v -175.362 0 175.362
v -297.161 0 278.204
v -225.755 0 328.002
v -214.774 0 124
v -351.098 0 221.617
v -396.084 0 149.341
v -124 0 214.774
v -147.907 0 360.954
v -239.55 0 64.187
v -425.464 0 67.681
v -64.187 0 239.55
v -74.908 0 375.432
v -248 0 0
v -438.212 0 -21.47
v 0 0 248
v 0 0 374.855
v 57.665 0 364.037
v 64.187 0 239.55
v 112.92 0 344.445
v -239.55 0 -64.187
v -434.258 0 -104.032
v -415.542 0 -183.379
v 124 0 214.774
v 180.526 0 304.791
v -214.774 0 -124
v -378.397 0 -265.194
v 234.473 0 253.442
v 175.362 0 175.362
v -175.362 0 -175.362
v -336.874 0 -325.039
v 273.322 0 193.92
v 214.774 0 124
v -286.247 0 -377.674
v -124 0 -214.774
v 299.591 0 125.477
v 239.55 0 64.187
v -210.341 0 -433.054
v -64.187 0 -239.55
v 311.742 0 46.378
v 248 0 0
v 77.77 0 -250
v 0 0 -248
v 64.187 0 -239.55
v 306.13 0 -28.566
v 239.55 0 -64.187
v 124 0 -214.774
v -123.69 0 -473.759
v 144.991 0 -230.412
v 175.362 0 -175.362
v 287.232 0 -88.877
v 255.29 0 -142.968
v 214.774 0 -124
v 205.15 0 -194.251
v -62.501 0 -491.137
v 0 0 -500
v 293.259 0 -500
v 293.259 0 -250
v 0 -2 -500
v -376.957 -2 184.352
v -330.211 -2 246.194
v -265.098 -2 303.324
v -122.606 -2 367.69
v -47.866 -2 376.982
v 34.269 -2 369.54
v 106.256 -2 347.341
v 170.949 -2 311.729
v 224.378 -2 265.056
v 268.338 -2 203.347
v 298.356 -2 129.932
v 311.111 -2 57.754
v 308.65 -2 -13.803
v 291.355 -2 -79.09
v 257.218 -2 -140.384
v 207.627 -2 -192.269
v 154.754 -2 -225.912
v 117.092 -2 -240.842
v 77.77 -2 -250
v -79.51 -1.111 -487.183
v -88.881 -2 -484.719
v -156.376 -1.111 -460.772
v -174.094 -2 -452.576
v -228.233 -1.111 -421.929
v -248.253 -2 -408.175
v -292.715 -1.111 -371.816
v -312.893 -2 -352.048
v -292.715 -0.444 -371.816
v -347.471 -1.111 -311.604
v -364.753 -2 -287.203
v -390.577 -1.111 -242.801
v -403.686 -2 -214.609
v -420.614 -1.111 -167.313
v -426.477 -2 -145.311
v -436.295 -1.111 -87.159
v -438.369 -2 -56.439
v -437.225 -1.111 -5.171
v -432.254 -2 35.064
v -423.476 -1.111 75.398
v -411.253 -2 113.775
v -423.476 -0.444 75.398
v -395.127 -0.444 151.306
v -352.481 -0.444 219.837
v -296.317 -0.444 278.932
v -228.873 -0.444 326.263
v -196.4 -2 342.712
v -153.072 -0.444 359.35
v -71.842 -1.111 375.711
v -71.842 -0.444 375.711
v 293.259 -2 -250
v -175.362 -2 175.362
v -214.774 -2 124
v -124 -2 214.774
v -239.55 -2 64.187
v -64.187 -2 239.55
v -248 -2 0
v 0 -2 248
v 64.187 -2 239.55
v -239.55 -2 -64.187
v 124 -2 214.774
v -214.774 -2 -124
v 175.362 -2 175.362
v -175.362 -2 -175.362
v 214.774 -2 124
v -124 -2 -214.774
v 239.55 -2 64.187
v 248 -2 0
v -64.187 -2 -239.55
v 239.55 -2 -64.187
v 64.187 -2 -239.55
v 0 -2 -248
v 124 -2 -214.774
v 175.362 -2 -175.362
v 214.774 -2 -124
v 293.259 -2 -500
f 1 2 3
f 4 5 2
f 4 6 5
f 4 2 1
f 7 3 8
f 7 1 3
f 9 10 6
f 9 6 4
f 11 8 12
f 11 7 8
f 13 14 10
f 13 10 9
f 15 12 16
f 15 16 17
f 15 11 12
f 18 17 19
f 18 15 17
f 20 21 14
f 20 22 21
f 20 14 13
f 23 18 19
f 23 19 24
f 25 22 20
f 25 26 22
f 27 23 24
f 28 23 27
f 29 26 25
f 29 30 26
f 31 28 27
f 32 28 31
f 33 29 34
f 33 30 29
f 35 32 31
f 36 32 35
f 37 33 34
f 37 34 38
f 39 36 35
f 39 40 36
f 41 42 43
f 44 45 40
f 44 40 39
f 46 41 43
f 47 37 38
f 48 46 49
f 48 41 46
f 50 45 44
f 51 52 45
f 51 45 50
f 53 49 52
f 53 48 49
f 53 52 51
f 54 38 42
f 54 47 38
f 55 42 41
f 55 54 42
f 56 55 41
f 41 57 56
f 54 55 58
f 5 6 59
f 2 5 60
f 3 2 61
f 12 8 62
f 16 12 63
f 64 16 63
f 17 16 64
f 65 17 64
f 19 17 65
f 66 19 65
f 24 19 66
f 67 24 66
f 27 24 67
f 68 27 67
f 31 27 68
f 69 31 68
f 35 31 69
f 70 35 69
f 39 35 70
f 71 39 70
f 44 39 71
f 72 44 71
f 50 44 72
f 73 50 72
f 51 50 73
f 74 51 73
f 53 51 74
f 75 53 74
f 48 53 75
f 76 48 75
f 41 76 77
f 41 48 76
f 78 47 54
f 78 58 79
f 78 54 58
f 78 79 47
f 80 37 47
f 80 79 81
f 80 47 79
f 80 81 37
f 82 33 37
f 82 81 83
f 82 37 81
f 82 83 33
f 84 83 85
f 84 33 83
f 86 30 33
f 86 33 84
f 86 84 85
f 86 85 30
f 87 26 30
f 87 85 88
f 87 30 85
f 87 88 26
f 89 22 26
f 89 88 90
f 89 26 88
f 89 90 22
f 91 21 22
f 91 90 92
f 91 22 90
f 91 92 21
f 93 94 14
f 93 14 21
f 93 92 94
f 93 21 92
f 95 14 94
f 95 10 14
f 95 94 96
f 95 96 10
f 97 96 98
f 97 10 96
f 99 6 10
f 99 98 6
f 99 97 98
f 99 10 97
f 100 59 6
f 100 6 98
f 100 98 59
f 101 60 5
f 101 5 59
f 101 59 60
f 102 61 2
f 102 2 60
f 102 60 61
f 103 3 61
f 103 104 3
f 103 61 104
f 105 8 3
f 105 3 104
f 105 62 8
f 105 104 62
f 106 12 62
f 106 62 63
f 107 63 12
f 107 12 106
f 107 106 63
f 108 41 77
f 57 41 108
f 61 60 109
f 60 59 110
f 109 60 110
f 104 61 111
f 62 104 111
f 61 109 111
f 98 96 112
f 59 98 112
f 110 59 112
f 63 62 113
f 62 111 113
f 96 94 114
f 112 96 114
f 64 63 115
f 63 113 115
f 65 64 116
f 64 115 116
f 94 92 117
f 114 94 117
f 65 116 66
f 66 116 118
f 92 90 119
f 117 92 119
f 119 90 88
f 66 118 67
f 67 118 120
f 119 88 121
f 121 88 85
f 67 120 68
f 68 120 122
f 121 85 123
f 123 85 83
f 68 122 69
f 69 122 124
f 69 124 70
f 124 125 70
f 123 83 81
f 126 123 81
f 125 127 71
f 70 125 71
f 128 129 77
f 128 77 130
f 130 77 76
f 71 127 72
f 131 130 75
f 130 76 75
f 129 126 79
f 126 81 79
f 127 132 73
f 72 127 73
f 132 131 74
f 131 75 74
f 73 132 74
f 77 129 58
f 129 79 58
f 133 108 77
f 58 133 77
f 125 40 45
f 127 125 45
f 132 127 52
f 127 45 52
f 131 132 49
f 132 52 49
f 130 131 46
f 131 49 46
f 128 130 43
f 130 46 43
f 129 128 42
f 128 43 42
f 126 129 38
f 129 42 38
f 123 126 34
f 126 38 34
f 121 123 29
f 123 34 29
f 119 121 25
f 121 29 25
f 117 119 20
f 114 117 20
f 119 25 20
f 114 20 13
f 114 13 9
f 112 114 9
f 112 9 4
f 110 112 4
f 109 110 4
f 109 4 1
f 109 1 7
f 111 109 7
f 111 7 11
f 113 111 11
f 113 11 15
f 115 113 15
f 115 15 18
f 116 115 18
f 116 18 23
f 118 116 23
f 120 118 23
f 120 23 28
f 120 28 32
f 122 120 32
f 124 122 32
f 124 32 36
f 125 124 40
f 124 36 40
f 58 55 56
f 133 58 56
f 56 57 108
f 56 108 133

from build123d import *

# Parameters (mm, degrees)
SKETCH4_W               = 2
SKETCH4_H               = 200
BOSS_EXTRUDE1_DEPTH     = 2
SKETCH6_W               = 1405.005943927
SKETCH6_H               = 405.322926854
CUT_EXTRUDE1_DEPTH      = 315.996533231
CUT_EXTRUDE1_DEPTH_BACK = 440.29577895
SKETCH7_R               = 248
CUT_EXTRUDE2_DEPTH      = 10
SKETCH9_W               = 293.259068653
SKETCH9_H               = 250
BOSS_EXTRUDE3_DEPTH     = 2


with BuildPart() as part:
    # Sweep1: sweep along a curve in space
    with BuildLine() as sweep1_path:
        add(Edge.make_bspline(
            [(0, 0, -250), (8.181230869, 0, -251.302083333), (16.490485858, 0, -252.202239115), (33.283843215, 0, -253.165004898), (41.767918014, 0, -253.227597369), (58.825529276, 0, -252.489812839), (67.399036198, 0, -251.689421172), (84.546849552, 0, -249.209035813), (93.121124768, 0, -247.529030536), (110.179448676, 0, -243.28197111), (118.663464802, 0, -240.714908644), (135.448838644, 0, -234.695772919), (143.750162786, 0, -231.243694762), (160.077308396, 0, -223.466249466), (168.103095642, 0, -219.140880964), (183.786929167, 0, -209.638354886), (191.44494095, 0, -204.461199558), (206.302623467, 0, -193.286364859), (213.502259812, 0, -187.288691386), (227.355264371, 0, -174.513728488), (234.008598689, 0, -167.736448609), (246.684770924, 0, -153.452592355), (252.707575824, 0, -145.946029132), (264.043165005, 0, -130.262996352), (269.35591753, 0, -122.086543468), (279.197554898, 0, -105.131744499), (283.726409621, 0, -96.353418486), (291.933011092, 0, -78.270957675), (295.610729717, 0, -68.966846184), (302.055300528, 0, -49.916318794), (304.822126933, 0, -40.169929234), (309.39344656, 0, -20.325024564), (311.197916667, 0, -10.226538586), (313.802083333, 0, 10.226538586), (314.601759746, 0, 20.581098128), (315.163575101, 0, 41.445373487), (314.925697135, 0, 51.955055437), (313.389873123, 0, 73.024682105), (312.091913646, 0, 83.584591073), (308.424085306, 0, 104.646879334), (306.054206696, 0, 115.149221353), (300.241736515, 0, 135.986781136), (296.799139049, 0, 146.321960485), (288.851700557, 0, 166.714935063), (284.346857616, 0, 176.772691135), (274.29678815, 0, 196.501059175), (268.751563779, 0, 206.171631657), (256.653978741, 0, 225.017553673), (250.101624339, 0, 234.192863818), (236.034287727, 0, 251.943048248), (228.519315892, 0, 260.517883668), (212.582264503, 0, 276.965947186), (204.160199387, 0, 284.839137372), (186.475120704, 0, 299.787933778), (177.212125552, 0, 306.863503462), (157.921492035, 0, 320.127395411), (147.893875928, 0, 326.315682935), (127.159841084, 0, 337.722731058), (116.453448267, 0, 342.941459114), (94.45651255, 0, 352.335503566), (83.165999013, 0, 356.510790002), (60.103456218, 0, 363.753400295), (48.331459506, 0, 366.820697137), (24.415636833, 0, 371.79296719), (12.271846303, 0, 373.697916667), (-12.271846303, 0, 376.302083333), (-24.671710397, 0, 377.001280376), (-49.606903759, 0, 377.162145305), (-62.14219286, 0, 376.623796902), (-87.223834934, 0, 374.289933407), (-99.770145948, 0, 372.49440612), (-124.746909116, 0, 367.639134798), (-137.177317938, 0, 364.579382855), (-161.794113597, 0, 357.201501919), (-173.980456169, 0, 352.883369455), (-197.981031483, 0, 343.007628195), (-209.795219484, 0, 337.45002047), (-232.924809953, 0, 325.127326834), (-244.240167671, 0, 318.362246594), (-266.248178179, 0, 303.669602597), (-276.940786686, 0, 295.742049119), (-297.583473029, 0, 278.782210595), (-307.533507523, 0, 269.749940398), (-326.576630001, 0, 250.650800517), (-335.669676056, 0, 240.583950166), (-352.891096632, 0, 219.497649054), (-361.0194311, 0, 208.478221971), (-376.211625816, 0, 185.579987719), (-383.275448339, 0, 173.701208389), (-396.247907217, 0, 149.18793767), (-402.156508607, 0, 136.553478049), (-412.73799604, 0, 110.642067425), (-417.410850286, 0, 97.365151842), (-425.451500061, 0, 70.290593641), (-428.81926734, 0, 56.492989778), (-434.192487821, 0, 28.506249102), (-436.197916667, 0, 14.31715402), (-438.802083333, 0, -14.31715402), (-439.400801007, 0, -28.762322666), (-439.160715508, 0, -57.768434031), (-438.321896668, 0, -72.329330283), (-435.189993691, 0, -101.422987763), (-432.896898594, 0, -115.955700823), (-426.854184291, 0, -144.846938898), (-423.104559014, 0, -159.205414524), (-414.161267324, 0, -187.601446057), (-408.96759986, 0, -201.638951853), (-397.163555833, 0, -229.247127902), (-390.553183323, 0, -242.817747834), (-375.957865518, 0, -269.348560731), (-367.972929409, 0, -282.308703686), (-350.685226452, 0, -307.478802685), (-341.3824739, 0, -319.688709553), (-321.530133463, 0, -343.223897809), (-310.980564904, 0, -354.549131378), (-288.719336532, 0, -376.187312816), (-277.007700944, 0, -386.50021474), (-252.520177403, 0, -405.994259486), (-239.744318391, 0, -415.175358738), (-213.238483403, 0, -432.295856222), (-199.508540849, 0, -440.235213744), (-171.216034255, 0, -454.773083377), (-156.653507831, 0, -461.3715581), (-126.8276223, 0, -473.140488514), (-111.564304671, 0, -478.31091057), (-80.477731064, 0, -487.149599827), (-64.65452005, 0, -490.817837544), (-32.596861371, 0, -496.592008451), (-16.362461737, 0, -498.697916667), (0, 0, -500)],
            knots=[0, 0, 0, 0, 0.015625, 0.015625, 0.03125, 0.03125, 0.046875, 0.046875, 0.0625, 0.0625, 0.078125, 0.078125, 0.09375, 0.09375, 0.109375, 0.109375, 0.125, 0.125, 0.140625, 0.140625, 0.15625, 0.15625, 0.171875, 0.171875, 0.1875, 0.1875, 0.203125, 0.203125, 0.21875, 0.21875, 0.234375, 0.234375, 0.25, 0.25, 0.265625, 0.265625, 0.28125, 0.28125, 0.296875, 0.296875, 0.3125, 0.3125, 0.328125, 0.328125, 0.34375, 0.34375, 0.359375, 0.359375, 0.375, 0.375, 0.390625, 0.390625, 0.40625, 0.40625, 0.421875, 0.421875, 0.4375, 0.4375, 0.453125, 0.453125, 0.46875, 0.46875, 0.484375, 0.484375, 0.5, 0.5, 0.515625, 0.515625, 0.53125, 0.53125, 0.546875, 0.546875, 0.5625, 0.5625, 0.578125, 0.578125, 0.59375, 0.59375, 0.609375, 0.609375, 0.625, 0.625, 0.640625, 0.640625, 0.65625, 0.65625, 0.671875, 0.671875, 0.6875, 0.6875, 0.703125, 0.703125, 0.71875, 0.71875, 0.734375, 0.734375, 0.75, 0.75, 0.765625, 0.765625, 0.78125, 0.78125, 0.796875, 0.796875, 0.8125, 0.8125, 0.828125, 0.828125, 0.84375, 0.84375, 0.859375, 0.859375, 0.875, 0.875, 0.890625, 0.890625, 0.90625, 0.90625, 0.921875, 0.921875, 0.9375, 0.9375, 0.953125, 0.953125, 0.96875, 0.96875, 0.984375, 0.984375, 1, 1, 1, 1], degree=3))
    # Sketch4 → Sweep1 (sweep)
    with BuildSketch(Plane(origin=(0, 0, 0), x_dir=(0, 0, -1), z_dir=(1, 0, 0))):
        with Locations((249, 100)):
            Rectangle(SKETCH4_W, SKETCH4_H)
    sweep(path=sweep1_path.line, is_frenet=True)

    # Sketch5 → Boss-Extrude1 (add)
    with BuildSketch(Plane.XZ):
        with BuildLine():
            Line((0, -250), (0, -500))
            add(Edge.make_bspline(
                [(0, -500), (-121.735694783, -491.432273979), (-313.700359878, -396.441660701), (-452.526897535, -136.273127559), (-438.495522047, 84.543459016), (-316.9901671, 288.560325686), (-69.978911087, 425.75216419), (285.053092388, 296.782675329), (348.131054403, -49.507708763), (180.649502041, -235.122306433), (56.018270753, -259.081421157), (0, -250)],
                knots=[0, 0, 0, 0, 0.158819891, 0.2524484, 0.369226368, 0.425419464, 0.55694465, 0.698898779, 0.846399016, 0.926374082, 1, 1, 1, 1], degree=3))
        make_face()
    extrude(amount=BOSS_EXTRUDE1_DEPTH)

    # Sketch6 → Cut-Extrude1 (cut, two sides)
    with BuildSketch(Plane(origin=(0, 0, 0), x_dir=(0, 0, -1), z_dir=(1, 0, 0))) as cut_extrude1_sk:
        with Locations((51.908730168, 202.661463427)):
            Rectangle(SKETCH6_W, SKETCH6_H)
    extrude(amount=CUT_EXTRUDE1_DEPTH, mode=Mode.SUBTRACT)
    extrude(cut_extrude1_sk.sketch, amount=-CUT_EXTRUDE1_DEPTH_BACK, mode=Mode.SUBTRACT)

    # Sketch7 → Cut-Extrude2 (cut)
    with BuildSketch(Plane(origin=(0, 0, 0), x_dir=(1, 0, 0), z_dir=(0, 1, 0))):
        Circle(SKETCH7_R)
    extrude(amount=-CUT_EXTRUDE2_DEPTH, mode=Mode.SUBTRACT)

    # Sketch9 → Boss-Extrude3 (add)
    with BuildSketch(Plane(origin=(0, 0, 0), x_dir=(1, 0, 0), z_dir=(0, 1, 0))):
        with Locations((146.629534327, 375)):
            Rectangle(SKETCH9_W, SKETCH9_H)
    extrude(amount=-BOSS_EXTRUDE3_DEPTH)


solid = part.part
